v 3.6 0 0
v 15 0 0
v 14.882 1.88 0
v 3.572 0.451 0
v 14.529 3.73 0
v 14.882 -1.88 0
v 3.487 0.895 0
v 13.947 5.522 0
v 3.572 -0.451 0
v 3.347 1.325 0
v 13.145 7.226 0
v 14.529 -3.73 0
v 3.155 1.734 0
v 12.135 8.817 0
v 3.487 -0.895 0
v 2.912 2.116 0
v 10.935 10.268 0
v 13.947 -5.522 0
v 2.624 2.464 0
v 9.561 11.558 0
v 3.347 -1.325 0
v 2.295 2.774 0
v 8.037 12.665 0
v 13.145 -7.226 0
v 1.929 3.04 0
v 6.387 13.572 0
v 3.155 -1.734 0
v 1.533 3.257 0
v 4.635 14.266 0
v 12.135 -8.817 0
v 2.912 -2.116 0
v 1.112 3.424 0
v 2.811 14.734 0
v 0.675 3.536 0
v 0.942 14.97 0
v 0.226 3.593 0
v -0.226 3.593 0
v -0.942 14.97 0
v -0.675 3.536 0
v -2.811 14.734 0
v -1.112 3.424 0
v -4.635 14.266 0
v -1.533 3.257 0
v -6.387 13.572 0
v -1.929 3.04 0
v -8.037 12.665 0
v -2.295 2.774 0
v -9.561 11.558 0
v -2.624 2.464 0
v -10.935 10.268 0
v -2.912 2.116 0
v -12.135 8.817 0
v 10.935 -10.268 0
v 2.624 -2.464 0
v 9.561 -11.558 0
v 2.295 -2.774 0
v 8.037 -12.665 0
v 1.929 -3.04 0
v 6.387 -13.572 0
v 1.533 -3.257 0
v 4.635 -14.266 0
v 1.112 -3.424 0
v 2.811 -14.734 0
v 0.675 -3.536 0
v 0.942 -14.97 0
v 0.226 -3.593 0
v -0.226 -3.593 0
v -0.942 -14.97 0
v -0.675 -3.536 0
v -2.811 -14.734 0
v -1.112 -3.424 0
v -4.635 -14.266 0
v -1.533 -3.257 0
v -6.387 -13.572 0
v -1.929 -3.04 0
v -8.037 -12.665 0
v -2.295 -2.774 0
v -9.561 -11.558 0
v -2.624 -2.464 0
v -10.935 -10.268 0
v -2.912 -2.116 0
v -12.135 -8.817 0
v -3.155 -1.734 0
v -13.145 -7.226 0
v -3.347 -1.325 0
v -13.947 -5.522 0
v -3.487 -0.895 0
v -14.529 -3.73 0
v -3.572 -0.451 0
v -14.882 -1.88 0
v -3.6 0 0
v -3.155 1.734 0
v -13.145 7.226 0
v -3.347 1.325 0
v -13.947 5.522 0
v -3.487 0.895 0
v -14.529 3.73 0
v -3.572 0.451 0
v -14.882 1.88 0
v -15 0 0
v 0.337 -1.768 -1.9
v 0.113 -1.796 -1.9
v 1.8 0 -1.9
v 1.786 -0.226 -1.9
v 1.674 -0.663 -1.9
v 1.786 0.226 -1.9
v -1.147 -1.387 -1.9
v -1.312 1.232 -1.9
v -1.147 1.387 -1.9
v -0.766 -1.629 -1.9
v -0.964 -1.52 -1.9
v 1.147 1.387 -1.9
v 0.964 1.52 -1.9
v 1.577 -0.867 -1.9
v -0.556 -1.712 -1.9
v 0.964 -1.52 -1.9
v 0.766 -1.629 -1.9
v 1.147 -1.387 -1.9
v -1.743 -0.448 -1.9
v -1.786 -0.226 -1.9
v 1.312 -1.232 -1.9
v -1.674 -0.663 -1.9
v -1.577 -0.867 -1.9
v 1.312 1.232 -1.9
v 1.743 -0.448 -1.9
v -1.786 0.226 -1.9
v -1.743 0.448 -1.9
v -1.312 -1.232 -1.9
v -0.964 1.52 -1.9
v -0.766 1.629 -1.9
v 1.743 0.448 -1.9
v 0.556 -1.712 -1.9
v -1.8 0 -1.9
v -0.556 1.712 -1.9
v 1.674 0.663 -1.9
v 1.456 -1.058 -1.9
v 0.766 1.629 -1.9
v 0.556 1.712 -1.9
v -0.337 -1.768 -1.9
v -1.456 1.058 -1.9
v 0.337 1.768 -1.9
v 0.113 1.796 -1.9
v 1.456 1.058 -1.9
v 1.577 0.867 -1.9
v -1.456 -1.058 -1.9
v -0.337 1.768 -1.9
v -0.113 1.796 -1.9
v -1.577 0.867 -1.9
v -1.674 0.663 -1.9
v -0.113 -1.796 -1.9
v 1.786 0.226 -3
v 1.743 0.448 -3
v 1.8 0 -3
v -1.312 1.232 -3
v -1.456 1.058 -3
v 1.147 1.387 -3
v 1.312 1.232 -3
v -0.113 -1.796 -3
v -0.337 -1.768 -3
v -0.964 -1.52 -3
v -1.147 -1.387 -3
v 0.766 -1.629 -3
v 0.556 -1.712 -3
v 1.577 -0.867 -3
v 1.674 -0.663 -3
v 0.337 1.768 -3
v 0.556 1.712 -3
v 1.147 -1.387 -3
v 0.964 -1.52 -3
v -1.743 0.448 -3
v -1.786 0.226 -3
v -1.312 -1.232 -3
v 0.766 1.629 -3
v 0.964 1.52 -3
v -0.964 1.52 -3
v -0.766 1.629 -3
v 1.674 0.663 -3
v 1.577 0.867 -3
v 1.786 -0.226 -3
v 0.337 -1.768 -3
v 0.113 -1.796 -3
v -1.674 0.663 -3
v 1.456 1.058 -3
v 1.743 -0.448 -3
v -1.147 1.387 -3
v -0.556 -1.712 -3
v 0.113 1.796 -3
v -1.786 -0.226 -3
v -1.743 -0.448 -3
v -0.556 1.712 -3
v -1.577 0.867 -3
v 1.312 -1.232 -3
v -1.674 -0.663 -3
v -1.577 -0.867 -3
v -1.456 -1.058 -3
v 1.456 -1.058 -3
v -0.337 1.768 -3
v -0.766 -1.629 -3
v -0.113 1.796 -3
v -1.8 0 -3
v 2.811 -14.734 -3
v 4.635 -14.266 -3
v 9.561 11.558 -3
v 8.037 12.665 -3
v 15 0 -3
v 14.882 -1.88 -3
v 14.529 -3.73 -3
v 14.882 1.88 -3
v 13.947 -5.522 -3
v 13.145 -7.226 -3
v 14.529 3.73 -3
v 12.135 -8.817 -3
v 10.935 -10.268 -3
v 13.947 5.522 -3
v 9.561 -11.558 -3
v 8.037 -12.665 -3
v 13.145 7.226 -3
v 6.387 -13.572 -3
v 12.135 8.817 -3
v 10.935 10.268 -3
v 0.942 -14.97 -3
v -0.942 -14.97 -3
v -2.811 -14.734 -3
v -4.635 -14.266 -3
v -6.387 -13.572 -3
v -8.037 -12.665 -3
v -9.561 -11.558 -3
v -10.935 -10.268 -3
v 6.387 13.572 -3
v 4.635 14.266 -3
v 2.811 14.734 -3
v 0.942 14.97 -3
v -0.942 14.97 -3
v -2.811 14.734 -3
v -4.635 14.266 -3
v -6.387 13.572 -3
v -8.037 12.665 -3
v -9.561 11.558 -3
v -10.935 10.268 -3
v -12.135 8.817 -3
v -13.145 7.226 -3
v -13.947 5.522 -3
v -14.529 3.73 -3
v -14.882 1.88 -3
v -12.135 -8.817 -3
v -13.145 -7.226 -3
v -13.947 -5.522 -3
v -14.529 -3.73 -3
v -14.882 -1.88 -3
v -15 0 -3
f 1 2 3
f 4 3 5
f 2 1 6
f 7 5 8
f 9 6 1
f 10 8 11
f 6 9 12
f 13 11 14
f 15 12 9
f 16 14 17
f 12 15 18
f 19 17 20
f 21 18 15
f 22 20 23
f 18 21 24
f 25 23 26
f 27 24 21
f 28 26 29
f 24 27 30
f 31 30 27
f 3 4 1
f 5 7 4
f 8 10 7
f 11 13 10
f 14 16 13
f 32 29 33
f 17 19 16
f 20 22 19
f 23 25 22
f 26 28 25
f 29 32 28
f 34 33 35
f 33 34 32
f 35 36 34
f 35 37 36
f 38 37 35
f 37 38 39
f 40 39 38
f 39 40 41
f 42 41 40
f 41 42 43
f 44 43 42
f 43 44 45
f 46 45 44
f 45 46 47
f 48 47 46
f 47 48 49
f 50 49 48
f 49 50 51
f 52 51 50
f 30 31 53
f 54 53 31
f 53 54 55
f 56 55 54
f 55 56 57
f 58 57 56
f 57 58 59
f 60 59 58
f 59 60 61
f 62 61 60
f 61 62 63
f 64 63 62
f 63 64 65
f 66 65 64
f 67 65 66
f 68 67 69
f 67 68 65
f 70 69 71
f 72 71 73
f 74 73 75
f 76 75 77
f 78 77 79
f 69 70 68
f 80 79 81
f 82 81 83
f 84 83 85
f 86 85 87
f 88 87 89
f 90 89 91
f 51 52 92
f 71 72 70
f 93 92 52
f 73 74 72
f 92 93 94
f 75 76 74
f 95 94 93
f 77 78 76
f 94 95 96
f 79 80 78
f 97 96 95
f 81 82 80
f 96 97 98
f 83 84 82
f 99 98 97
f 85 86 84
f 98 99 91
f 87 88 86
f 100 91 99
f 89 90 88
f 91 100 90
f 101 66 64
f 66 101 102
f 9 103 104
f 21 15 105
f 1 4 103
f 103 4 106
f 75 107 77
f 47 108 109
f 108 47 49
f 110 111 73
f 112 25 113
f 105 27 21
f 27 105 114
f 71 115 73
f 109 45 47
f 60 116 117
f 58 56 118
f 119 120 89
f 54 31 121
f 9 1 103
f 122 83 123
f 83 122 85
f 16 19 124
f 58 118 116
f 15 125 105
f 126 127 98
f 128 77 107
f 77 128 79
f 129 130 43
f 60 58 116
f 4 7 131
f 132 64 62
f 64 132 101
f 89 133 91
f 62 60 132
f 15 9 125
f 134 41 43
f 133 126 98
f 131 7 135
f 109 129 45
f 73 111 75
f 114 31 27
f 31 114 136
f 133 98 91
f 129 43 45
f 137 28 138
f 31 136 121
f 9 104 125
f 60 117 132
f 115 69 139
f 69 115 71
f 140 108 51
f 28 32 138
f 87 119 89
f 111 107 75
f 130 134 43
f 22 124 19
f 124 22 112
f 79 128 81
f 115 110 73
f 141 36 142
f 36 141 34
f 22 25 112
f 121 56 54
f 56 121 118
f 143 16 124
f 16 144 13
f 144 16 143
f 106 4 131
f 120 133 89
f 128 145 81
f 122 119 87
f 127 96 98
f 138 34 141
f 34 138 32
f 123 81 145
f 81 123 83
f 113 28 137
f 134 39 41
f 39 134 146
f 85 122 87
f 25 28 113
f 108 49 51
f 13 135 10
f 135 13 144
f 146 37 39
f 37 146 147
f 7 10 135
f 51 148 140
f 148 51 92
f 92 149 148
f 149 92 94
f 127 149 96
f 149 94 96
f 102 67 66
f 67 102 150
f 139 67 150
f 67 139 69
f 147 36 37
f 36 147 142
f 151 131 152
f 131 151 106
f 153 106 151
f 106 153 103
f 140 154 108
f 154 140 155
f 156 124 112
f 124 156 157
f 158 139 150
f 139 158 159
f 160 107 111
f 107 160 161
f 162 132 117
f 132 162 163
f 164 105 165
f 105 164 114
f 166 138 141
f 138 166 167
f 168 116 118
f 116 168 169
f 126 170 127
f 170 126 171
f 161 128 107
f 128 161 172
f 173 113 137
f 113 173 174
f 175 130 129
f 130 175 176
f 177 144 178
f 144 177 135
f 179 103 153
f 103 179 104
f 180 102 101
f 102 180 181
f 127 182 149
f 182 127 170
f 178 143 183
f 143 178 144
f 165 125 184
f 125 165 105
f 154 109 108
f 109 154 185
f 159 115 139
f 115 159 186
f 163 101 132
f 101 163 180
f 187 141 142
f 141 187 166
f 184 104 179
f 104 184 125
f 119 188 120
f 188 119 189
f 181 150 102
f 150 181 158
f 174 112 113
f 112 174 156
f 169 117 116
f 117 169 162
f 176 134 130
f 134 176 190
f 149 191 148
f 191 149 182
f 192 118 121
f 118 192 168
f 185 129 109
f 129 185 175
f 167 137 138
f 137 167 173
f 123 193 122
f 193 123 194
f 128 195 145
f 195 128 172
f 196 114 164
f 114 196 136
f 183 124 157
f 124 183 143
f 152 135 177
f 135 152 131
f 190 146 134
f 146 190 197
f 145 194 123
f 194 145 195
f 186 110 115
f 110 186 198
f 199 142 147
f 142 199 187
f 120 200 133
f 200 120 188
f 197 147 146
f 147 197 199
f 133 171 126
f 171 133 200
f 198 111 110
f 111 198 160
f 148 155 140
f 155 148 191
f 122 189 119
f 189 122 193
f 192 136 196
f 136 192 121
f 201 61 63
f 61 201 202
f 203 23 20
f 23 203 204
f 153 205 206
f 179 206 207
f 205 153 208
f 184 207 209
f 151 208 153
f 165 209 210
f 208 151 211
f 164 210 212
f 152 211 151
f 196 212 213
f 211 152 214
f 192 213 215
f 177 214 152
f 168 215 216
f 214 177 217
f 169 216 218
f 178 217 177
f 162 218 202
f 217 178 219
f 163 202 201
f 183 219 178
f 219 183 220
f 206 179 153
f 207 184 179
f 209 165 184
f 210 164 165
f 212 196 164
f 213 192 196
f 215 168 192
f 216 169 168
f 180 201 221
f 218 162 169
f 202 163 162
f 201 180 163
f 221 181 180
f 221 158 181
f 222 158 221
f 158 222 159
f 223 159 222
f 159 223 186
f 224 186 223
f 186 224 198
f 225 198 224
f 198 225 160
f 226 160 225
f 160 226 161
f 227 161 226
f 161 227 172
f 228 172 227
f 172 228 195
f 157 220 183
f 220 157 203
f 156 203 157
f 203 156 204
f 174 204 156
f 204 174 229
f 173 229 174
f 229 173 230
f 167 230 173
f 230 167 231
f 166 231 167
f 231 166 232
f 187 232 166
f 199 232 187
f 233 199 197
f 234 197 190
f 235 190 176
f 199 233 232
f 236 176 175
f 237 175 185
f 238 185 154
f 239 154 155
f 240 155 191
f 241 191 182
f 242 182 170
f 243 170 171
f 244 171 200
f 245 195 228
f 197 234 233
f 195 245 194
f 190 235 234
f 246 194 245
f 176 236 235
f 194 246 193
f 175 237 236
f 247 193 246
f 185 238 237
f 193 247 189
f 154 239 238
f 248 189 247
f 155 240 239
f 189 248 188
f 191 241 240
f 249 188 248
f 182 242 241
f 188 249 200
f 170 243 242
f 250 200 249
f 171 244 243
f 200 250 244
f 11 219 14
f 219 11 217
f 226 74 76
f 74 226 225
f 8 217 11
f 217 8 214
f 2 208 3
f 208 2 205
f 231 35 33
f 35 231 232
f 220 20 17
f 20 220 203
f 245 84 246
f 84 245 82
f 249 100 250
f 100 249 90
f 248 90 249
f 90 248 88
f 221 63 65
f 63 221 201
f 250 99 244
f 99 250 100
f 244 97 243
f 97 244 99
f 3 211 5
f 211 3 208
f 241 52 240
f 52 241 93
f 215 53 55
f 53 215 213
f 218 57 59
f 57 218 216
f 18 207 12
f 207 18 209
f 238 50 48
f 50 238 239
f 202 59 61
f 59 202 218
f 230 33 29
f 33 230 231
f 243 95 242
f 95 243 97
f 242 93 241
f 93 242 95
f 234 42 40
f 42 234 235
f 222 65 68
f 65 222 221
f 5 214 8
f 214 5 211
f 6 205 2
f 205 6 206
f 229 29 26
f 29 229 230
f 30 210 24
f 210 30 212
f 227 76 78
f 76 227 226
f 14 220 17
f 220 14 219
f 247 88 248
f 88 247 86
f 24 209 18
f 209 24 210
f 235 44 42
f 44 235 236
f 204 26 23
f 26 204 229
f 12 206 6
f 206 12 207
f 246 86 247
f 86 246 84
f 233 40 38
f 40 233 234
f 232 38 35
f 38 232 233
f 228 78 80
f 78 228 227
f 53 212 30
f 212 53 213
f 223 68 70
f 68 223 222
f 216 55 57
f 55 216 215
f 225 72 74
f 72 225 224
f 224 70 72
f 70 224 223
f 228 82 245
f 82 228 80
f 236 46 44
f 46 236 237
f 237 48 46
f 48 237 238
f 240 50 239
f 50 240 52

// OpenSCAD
$fn = 50;

difference() {
	union() {
		translate(v = [0, 0, -3.0]) {
			cylinder(h = 3, r = 15.0);
		}
	}
	union() {
		translate(v = [0, 0, 0]) {
			rotate(a = [0, 0, 0]) {
				difference() {
					union() {
						translate(v = [0, 0, -6.0]) {
							cylinder(h = 6, r = 1.5);
						}
						translate(v = [0, 0, -1.9]) {
							cylinder(h = 1.9, r1 = 1.8, r2 = 3.6);
						}
						translate(v = [0, 0, -6.0]) {
							cylinder(h = 6, r = 1.8);
						}
						translate(v = [0, 0, -6.0]) {
							cylinder(h = 6, r = 1.5);
						}
					}
					union();
				}
			}
		}
	}
}
